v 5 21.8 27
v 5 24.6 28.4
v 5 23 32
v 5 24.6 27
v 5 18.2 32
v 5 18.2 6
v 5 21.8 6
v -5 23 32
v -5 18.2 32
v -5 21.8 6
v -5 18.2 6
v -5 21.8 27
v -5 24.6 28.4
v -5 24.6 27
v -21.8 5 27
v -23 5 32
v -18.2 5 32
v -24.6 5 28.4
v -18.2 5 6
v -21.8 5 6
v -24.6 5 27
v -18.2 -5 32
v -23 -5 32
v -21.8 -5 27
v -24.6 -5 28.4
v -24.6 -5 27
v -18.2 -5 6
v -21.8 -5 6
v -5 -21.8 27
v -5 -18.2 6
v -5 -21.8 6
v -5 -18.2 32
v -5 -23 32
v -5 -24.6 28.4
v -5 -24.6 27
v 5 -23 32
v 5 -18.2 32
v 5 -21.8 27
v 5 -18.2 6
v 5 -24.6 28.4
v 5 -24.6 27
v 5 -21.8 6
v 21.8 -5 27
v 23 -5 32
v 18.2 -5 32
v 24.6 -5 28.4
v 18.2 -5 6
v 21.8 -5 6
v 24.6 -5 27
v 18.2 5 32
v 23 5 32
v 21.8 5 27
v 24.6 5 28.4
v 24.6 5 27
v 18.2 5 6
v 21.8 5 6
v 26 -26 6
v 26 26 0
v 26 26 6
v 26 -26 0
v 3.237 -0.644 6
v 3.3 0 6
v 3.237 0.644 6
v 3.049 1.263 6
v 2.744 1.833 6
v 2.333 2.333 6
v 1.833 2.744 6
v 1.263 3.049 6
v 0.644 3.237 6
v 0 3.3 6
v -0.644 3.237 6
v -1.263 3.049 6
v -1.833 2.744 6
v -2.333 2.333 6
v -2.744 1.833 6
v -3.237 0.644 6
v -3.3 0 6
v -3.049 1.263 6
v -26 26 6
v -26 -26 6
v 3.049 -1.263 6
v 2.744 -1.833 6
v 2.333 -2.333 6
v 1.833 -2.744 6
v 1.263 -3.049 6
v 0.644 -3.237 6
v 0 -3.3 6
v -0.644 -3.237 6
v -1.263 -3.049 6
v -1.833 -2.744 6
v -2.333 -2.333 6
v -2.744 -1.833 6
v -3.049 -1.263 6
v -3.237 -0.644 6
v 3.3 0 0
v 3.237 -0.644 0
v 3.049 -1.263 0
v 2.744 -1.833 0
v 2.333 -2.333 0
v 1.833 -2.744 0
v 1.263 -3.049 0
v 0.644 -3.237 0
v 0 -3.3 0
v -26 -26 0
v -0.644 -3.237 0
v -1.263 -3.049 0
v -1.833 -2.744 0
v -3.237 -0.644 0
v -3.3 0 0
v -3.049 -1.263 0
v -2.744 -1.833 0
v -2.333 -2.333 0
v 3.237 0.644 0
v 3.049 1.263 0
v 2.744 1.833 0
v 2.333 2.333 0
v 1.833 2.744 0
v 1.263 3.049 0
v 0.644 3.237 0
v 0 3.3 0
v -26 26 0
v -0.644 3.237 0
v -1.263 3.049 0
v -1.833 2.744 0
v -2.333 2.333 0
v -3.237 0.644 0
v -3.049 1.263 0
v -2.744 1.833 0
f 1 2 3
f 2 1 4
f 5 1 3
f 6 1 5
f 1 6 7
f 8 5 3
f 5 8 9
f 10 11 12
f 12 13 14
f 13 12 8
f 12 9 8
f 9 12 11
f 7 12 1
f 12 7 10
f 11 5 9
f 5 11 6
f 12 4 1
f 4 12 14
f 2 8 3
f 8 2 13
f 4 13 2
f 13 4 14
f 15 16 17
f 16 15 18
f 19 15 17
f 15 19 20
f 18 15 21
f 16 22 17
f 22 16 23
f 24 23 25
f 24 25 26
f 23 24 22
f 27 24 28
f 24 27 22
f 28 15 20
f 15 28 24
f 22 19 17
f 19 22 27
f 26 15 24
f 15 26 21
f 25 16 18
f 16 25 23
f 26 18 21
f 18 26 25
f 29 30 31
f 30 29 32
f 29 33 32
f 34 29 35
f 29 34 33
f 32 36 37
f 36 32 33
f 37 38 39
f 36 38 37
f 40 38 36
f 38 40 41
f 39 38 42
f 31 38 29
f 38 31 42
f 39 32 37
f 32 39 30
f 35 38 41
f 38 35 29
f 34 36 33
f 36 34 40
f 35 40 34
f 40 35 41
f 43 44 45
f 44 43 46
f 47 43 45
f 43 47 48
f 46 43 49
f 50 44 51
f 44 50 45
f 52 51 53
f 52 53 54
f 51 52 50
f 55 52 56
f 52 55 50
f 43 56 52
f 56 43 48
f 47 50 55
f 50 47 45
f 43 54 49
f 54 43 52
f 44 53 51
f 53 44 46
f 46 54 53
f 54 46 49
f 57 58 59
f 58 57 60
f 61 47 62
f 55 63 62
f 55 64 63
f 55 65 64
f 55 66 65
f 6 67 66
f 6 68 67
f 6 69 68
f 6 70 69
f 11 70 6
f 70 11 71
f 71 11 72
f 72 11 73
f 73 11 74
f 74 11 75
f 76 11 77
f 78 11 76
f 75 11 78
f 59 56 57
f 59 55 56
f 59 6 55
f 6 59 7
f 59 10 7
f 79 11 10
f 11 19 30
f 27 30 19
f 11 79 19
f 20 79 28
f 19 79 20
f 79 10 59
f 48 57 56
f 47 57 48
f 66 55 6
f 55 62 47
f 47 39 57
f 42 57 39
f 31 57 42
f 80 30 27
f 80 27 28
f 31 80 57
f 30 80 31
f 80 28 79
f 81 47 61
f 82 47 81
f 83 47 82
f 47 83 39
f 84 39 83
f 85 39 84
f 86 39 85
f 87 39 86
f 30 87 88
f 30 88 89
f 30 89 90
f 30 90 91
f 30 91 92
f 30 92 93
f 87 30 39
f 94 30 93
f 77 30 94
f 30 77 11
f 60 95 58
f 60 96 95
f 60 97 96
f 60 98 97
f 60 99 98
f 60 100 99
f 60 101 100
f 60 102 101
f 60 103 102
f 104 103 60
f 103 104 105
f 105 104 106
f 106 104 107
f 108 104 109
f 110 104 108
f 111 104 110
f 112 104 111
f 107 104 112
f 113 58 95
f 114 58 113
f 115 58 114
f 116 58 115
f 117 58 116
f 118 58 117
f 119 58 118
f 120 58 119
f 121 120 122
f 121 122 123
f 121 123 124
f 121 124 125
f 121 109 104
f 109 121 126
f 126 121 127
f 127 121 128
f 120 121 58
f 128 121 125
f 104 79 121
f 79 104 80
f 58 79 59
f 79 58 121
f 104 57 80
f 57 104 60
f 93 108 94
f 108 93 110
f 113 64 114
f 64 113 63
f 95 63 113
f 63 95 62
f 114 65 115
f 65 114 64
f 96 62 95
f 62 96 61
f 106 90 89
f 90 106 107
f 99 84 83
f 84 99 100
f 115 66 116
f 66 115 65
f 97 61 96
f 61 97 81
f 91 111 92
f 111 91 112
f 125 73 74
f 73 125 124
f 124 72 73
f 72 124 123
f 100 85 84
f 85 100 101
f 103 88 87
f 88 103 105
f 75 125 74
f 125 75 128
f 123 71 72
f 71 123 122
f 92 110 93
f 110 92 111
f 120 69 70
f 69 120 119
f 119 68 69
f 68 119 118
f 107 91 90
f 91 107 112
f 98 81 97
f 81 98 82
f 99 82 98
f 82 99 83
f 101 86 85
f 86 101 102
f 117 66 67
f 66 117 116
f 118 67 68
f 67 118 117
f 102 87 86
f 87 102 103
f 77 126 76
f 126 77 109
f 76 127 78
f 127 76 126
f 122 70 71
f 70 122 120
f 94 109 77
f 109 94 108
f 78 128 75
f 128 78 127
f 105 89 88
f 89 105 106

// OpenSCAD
$fn = 32;

// ----------------------------------------------------------------------
// Snap-fit latch: 4 arms, 26 mm tall, 3 mm undercut hooks
// ----------------------------------------------------------------------

// --- parameters (mm) ---
base_d = 52;              // base plate depth
base_h = 6;               // base plate thickness
span = 40;                // distance between opposite arms
arm_t = 3.6;              // arm thickness
arm_d = 10;               // arm width
height = 26;              // free arm length
head_len = 3;             // hook reach
head_h = 5;               // hook height
lead = 1.4;               // lead-in ramp thickness
bore_d = 6.6;             // base fixing bore
top_z = 32;               // height of the arm tips above the base

arms = 4;

difference() {
  union() {
    /* base plate, centred on the arm ring */
    translate([-26, -26, 0]) cube([base_d, base_d, base_h]);
    for (a = [0 : 360 / arms : 359]) rotate([0, 0, a]) {
    /* arm, sunk 0.5 mm into the base */
    translate([-arm_d / 2, span / 2 - arm_t / 2, base_h - 0.5]) cube([arm_d, arm_t, height + 0.5]);
    /* hook: a convex hull of a tall inner block and a thin outer lip
       gives a flat undercut below and a lead-in ramp on top */
    hull() {
      translate([-arm_d / 2, span / 2 + arm_t / 2 - 0.6, top_z - head_h]) cube([arm_d, lead + 0.4, head_h]);
      translate([-arm_d / 2, span / 2 + arm_t / 2 - 0.2, top_z - head_h]) cube([arm_d, head_len, lead]);
    }
    }
  }
  translate([0, 0, -2.5]) cylinder(h = base_h + 5, d = bore_d);
}
